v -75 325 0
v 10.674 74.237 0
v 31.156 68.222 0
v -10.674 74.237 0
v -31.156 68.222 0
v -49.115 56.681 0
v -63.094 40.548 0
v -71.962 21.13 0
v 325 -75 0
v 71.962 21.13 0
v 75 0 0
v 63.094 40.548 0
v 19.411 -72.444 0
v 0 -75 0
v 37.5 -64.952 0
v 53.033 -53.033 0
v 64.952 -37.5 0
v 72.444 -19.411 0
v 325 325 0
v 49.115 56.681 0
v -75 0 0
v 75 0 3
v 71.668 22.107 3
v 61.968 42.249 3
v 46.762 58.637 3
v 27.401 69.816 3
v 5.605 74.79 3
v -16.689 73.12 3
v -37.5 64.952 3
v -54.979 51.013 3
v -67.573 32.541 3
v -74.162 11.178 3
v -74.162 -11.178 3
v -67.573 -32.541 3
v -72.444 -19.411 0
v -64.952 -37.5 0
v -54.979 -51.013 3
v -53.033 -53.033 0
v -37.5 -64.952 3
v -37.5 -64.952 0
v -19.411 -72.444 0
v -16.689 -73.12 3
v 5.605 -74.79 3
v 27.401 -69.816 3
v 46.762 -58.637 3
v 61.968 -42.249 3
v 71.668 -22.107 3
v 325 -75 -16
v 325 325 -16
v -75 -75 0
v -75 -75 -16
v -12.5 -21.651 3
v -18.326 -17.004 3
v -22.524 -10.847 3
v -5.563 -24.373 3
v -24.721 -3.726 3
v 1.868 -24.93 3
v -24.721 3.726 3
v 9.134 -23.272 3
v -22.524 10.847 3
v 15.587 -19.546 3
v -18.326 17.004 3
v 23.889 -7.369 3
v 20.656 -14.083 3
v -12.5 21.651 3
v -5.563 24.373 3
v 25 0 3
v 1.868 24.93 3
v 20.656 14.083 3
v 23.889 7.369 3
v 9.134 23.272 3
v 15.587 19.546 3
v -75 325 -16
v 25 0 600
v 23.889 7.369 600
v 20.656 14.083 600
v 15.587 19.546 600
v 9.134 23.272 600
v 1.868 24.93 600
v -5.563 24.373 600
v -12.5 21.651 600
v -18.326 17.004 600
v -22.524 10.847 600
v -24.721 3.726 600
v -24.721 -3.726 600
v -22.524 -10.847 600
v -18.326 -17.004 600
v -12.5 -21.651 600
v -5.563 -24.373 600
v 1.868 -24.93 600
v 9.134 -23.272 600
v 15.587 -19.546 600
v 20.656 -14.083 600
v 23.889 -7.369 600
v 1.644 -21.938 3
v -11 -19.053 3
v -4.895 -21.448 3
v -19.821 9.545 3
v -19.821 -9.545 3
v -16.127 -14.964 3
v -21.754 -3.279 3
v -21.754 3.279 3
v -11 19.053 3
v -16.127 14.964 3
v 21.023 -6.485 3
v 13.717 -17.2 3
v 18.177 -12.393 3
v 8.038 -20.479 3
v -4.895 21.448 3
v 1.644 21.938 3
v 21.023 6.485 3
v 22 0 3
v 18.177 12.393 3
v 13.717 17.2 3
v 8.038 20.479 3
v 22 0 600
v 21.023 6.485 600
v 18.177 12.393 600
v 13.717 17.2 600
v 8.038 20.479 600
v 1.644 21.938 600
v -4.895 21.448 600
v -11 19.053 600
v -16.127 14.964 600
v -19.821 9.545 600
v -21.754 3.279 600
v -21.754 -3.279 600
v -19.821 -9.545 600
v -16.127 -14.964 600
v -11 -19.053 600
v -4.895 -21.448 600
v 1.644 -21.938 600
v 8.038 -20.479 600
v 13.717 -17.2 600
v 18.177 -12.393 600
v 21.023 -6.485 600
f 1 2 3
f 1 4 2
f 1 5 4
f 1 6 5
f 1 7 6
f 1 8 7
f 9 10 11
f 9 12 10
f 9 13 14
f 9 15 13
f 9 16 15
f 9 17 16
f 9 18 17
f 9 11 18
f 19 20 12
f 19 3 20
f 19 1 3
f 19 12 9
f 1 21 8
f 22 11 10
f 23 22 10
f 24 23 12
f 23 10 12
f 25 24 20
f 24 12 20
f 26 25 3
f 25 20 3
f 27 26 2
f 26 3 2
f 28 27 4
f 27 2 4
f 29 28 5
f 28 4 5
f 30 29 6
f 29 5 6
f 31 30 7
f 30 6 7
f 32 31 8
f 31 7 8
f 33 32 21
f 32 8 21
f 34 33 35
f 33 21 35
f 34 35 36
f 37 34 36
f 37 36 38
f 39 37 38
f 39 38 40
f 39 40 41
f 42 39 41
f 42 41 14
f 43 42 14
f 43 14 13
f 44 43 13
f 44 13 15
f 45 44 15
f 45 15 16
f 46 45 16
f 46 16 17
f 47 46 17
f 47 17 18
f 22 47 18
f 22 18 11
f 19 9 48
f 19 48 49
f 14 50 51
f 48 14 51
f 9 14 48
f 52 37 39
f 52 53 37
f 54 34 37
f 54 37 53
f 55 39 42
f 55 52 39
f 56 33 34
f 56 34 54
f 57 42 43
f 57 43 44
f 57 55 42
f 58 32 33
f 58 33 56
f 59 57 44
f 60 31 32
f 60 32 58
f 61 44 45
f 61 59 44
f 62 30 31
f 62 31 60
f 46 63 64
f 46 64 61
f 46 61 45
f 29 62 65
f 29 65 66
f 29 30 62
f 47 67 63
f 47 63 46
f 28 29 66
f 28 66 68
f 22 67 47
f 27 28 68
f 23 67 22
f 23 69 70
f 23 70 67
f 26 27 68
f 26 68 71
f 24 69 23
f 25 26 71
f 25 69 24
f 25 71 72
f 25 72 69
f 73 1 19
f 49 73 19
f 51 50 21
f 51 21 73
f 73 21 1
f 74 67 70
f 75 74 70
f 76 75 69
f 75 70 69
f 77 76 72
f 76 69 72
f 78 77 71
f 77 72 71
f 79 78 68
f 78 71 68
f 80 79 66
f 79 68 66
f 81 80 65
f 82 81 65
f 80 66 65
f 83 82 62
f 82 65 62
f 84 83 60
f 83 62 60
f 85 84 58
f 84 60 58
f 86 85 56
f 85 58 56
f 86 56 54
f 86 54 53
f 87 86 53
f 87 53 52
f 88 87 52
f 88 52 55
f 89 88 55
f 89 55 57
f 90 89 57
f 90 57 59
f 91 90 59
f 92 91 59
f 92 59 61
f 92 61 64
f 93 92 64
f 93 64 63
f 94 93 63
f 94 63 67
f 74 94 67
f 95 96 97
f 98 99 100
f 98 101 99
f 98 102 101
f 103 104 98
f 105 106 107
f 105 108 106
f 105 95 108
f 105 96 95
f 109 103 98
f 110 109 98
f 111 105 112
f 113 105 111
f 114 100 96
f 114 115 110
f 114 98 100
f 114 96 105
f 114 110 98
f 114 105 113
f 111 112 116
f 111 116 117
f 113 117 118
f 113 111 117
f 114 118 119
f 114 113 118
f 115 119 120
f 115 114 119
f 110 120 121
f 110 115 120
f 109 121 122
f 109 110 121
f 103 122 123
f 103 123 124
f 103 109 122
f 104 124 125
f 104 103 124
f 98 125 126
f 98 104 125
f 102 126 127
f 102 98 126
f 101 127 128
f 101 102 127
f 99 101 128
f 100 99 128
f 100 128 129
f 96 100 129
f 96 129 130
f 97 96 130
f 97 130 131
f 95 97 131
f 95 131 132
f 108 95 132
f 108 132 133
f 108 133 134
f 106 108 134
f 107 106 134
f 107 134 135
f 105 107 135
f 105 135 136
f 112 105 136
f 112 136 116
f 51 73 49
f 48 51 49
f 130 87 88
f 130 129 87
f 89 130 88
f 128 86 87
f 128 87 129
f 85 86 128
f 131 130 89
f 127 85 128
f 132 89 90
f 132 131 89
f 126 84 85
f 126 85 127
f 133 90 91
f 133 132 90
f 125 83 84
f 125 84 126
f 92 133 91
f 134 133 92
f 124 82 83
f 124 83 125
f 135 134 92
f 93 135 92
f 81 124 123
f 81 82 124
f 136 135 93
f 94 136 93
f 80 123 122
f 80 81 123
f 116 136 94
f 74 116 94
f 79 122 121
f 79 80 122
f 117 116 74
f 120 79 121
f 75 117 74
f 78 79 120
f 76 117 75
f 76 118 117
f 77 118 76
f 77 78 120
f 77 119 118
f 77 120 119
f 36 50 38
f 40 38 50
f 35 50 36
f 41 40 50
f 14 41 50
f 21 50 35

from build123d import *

# Parameters (mm, degrees)
F0_R     = 25
F1_DEPTH = 600
F2_T     = -3
F3_R     = 75
F4_DEPTH = 3
F5_W     = 400
F5_H     = 400
F6_DEPTH = 16


# Not quite as in the source:
# - a feature names something its author has since deleted; it is built from what else it names


with BuildPart() as f1:
    # F0 (on Top) → F1 (new body)
    with BuildSketch(Plane.XY):
        Circle(F0_R)
    extrude(amount=F1_DEPTH)

    # F2
    f2_openings = [f1.faces().sort_by_distance(p)[0] for p in [
        (0, 0, 600),
        (0, 0, 0),
    ]]
    offset(amount=F2_T, openings=f2_openings)

    # F3 (on Top) → F4 (join)
    with BuildSketch(Plane.XY):
        Circle(F3_R)
    extrude(amount=F4_DEPTH)

    # F5 (on Top) → F6 (join)
    with BuildSketch(Plane.XY):
        with Locations((125, 125)):
            Rectangle(F5_W, F5_H)
    extrude(amount=-F6_DEPTH)


solid = f1.part
